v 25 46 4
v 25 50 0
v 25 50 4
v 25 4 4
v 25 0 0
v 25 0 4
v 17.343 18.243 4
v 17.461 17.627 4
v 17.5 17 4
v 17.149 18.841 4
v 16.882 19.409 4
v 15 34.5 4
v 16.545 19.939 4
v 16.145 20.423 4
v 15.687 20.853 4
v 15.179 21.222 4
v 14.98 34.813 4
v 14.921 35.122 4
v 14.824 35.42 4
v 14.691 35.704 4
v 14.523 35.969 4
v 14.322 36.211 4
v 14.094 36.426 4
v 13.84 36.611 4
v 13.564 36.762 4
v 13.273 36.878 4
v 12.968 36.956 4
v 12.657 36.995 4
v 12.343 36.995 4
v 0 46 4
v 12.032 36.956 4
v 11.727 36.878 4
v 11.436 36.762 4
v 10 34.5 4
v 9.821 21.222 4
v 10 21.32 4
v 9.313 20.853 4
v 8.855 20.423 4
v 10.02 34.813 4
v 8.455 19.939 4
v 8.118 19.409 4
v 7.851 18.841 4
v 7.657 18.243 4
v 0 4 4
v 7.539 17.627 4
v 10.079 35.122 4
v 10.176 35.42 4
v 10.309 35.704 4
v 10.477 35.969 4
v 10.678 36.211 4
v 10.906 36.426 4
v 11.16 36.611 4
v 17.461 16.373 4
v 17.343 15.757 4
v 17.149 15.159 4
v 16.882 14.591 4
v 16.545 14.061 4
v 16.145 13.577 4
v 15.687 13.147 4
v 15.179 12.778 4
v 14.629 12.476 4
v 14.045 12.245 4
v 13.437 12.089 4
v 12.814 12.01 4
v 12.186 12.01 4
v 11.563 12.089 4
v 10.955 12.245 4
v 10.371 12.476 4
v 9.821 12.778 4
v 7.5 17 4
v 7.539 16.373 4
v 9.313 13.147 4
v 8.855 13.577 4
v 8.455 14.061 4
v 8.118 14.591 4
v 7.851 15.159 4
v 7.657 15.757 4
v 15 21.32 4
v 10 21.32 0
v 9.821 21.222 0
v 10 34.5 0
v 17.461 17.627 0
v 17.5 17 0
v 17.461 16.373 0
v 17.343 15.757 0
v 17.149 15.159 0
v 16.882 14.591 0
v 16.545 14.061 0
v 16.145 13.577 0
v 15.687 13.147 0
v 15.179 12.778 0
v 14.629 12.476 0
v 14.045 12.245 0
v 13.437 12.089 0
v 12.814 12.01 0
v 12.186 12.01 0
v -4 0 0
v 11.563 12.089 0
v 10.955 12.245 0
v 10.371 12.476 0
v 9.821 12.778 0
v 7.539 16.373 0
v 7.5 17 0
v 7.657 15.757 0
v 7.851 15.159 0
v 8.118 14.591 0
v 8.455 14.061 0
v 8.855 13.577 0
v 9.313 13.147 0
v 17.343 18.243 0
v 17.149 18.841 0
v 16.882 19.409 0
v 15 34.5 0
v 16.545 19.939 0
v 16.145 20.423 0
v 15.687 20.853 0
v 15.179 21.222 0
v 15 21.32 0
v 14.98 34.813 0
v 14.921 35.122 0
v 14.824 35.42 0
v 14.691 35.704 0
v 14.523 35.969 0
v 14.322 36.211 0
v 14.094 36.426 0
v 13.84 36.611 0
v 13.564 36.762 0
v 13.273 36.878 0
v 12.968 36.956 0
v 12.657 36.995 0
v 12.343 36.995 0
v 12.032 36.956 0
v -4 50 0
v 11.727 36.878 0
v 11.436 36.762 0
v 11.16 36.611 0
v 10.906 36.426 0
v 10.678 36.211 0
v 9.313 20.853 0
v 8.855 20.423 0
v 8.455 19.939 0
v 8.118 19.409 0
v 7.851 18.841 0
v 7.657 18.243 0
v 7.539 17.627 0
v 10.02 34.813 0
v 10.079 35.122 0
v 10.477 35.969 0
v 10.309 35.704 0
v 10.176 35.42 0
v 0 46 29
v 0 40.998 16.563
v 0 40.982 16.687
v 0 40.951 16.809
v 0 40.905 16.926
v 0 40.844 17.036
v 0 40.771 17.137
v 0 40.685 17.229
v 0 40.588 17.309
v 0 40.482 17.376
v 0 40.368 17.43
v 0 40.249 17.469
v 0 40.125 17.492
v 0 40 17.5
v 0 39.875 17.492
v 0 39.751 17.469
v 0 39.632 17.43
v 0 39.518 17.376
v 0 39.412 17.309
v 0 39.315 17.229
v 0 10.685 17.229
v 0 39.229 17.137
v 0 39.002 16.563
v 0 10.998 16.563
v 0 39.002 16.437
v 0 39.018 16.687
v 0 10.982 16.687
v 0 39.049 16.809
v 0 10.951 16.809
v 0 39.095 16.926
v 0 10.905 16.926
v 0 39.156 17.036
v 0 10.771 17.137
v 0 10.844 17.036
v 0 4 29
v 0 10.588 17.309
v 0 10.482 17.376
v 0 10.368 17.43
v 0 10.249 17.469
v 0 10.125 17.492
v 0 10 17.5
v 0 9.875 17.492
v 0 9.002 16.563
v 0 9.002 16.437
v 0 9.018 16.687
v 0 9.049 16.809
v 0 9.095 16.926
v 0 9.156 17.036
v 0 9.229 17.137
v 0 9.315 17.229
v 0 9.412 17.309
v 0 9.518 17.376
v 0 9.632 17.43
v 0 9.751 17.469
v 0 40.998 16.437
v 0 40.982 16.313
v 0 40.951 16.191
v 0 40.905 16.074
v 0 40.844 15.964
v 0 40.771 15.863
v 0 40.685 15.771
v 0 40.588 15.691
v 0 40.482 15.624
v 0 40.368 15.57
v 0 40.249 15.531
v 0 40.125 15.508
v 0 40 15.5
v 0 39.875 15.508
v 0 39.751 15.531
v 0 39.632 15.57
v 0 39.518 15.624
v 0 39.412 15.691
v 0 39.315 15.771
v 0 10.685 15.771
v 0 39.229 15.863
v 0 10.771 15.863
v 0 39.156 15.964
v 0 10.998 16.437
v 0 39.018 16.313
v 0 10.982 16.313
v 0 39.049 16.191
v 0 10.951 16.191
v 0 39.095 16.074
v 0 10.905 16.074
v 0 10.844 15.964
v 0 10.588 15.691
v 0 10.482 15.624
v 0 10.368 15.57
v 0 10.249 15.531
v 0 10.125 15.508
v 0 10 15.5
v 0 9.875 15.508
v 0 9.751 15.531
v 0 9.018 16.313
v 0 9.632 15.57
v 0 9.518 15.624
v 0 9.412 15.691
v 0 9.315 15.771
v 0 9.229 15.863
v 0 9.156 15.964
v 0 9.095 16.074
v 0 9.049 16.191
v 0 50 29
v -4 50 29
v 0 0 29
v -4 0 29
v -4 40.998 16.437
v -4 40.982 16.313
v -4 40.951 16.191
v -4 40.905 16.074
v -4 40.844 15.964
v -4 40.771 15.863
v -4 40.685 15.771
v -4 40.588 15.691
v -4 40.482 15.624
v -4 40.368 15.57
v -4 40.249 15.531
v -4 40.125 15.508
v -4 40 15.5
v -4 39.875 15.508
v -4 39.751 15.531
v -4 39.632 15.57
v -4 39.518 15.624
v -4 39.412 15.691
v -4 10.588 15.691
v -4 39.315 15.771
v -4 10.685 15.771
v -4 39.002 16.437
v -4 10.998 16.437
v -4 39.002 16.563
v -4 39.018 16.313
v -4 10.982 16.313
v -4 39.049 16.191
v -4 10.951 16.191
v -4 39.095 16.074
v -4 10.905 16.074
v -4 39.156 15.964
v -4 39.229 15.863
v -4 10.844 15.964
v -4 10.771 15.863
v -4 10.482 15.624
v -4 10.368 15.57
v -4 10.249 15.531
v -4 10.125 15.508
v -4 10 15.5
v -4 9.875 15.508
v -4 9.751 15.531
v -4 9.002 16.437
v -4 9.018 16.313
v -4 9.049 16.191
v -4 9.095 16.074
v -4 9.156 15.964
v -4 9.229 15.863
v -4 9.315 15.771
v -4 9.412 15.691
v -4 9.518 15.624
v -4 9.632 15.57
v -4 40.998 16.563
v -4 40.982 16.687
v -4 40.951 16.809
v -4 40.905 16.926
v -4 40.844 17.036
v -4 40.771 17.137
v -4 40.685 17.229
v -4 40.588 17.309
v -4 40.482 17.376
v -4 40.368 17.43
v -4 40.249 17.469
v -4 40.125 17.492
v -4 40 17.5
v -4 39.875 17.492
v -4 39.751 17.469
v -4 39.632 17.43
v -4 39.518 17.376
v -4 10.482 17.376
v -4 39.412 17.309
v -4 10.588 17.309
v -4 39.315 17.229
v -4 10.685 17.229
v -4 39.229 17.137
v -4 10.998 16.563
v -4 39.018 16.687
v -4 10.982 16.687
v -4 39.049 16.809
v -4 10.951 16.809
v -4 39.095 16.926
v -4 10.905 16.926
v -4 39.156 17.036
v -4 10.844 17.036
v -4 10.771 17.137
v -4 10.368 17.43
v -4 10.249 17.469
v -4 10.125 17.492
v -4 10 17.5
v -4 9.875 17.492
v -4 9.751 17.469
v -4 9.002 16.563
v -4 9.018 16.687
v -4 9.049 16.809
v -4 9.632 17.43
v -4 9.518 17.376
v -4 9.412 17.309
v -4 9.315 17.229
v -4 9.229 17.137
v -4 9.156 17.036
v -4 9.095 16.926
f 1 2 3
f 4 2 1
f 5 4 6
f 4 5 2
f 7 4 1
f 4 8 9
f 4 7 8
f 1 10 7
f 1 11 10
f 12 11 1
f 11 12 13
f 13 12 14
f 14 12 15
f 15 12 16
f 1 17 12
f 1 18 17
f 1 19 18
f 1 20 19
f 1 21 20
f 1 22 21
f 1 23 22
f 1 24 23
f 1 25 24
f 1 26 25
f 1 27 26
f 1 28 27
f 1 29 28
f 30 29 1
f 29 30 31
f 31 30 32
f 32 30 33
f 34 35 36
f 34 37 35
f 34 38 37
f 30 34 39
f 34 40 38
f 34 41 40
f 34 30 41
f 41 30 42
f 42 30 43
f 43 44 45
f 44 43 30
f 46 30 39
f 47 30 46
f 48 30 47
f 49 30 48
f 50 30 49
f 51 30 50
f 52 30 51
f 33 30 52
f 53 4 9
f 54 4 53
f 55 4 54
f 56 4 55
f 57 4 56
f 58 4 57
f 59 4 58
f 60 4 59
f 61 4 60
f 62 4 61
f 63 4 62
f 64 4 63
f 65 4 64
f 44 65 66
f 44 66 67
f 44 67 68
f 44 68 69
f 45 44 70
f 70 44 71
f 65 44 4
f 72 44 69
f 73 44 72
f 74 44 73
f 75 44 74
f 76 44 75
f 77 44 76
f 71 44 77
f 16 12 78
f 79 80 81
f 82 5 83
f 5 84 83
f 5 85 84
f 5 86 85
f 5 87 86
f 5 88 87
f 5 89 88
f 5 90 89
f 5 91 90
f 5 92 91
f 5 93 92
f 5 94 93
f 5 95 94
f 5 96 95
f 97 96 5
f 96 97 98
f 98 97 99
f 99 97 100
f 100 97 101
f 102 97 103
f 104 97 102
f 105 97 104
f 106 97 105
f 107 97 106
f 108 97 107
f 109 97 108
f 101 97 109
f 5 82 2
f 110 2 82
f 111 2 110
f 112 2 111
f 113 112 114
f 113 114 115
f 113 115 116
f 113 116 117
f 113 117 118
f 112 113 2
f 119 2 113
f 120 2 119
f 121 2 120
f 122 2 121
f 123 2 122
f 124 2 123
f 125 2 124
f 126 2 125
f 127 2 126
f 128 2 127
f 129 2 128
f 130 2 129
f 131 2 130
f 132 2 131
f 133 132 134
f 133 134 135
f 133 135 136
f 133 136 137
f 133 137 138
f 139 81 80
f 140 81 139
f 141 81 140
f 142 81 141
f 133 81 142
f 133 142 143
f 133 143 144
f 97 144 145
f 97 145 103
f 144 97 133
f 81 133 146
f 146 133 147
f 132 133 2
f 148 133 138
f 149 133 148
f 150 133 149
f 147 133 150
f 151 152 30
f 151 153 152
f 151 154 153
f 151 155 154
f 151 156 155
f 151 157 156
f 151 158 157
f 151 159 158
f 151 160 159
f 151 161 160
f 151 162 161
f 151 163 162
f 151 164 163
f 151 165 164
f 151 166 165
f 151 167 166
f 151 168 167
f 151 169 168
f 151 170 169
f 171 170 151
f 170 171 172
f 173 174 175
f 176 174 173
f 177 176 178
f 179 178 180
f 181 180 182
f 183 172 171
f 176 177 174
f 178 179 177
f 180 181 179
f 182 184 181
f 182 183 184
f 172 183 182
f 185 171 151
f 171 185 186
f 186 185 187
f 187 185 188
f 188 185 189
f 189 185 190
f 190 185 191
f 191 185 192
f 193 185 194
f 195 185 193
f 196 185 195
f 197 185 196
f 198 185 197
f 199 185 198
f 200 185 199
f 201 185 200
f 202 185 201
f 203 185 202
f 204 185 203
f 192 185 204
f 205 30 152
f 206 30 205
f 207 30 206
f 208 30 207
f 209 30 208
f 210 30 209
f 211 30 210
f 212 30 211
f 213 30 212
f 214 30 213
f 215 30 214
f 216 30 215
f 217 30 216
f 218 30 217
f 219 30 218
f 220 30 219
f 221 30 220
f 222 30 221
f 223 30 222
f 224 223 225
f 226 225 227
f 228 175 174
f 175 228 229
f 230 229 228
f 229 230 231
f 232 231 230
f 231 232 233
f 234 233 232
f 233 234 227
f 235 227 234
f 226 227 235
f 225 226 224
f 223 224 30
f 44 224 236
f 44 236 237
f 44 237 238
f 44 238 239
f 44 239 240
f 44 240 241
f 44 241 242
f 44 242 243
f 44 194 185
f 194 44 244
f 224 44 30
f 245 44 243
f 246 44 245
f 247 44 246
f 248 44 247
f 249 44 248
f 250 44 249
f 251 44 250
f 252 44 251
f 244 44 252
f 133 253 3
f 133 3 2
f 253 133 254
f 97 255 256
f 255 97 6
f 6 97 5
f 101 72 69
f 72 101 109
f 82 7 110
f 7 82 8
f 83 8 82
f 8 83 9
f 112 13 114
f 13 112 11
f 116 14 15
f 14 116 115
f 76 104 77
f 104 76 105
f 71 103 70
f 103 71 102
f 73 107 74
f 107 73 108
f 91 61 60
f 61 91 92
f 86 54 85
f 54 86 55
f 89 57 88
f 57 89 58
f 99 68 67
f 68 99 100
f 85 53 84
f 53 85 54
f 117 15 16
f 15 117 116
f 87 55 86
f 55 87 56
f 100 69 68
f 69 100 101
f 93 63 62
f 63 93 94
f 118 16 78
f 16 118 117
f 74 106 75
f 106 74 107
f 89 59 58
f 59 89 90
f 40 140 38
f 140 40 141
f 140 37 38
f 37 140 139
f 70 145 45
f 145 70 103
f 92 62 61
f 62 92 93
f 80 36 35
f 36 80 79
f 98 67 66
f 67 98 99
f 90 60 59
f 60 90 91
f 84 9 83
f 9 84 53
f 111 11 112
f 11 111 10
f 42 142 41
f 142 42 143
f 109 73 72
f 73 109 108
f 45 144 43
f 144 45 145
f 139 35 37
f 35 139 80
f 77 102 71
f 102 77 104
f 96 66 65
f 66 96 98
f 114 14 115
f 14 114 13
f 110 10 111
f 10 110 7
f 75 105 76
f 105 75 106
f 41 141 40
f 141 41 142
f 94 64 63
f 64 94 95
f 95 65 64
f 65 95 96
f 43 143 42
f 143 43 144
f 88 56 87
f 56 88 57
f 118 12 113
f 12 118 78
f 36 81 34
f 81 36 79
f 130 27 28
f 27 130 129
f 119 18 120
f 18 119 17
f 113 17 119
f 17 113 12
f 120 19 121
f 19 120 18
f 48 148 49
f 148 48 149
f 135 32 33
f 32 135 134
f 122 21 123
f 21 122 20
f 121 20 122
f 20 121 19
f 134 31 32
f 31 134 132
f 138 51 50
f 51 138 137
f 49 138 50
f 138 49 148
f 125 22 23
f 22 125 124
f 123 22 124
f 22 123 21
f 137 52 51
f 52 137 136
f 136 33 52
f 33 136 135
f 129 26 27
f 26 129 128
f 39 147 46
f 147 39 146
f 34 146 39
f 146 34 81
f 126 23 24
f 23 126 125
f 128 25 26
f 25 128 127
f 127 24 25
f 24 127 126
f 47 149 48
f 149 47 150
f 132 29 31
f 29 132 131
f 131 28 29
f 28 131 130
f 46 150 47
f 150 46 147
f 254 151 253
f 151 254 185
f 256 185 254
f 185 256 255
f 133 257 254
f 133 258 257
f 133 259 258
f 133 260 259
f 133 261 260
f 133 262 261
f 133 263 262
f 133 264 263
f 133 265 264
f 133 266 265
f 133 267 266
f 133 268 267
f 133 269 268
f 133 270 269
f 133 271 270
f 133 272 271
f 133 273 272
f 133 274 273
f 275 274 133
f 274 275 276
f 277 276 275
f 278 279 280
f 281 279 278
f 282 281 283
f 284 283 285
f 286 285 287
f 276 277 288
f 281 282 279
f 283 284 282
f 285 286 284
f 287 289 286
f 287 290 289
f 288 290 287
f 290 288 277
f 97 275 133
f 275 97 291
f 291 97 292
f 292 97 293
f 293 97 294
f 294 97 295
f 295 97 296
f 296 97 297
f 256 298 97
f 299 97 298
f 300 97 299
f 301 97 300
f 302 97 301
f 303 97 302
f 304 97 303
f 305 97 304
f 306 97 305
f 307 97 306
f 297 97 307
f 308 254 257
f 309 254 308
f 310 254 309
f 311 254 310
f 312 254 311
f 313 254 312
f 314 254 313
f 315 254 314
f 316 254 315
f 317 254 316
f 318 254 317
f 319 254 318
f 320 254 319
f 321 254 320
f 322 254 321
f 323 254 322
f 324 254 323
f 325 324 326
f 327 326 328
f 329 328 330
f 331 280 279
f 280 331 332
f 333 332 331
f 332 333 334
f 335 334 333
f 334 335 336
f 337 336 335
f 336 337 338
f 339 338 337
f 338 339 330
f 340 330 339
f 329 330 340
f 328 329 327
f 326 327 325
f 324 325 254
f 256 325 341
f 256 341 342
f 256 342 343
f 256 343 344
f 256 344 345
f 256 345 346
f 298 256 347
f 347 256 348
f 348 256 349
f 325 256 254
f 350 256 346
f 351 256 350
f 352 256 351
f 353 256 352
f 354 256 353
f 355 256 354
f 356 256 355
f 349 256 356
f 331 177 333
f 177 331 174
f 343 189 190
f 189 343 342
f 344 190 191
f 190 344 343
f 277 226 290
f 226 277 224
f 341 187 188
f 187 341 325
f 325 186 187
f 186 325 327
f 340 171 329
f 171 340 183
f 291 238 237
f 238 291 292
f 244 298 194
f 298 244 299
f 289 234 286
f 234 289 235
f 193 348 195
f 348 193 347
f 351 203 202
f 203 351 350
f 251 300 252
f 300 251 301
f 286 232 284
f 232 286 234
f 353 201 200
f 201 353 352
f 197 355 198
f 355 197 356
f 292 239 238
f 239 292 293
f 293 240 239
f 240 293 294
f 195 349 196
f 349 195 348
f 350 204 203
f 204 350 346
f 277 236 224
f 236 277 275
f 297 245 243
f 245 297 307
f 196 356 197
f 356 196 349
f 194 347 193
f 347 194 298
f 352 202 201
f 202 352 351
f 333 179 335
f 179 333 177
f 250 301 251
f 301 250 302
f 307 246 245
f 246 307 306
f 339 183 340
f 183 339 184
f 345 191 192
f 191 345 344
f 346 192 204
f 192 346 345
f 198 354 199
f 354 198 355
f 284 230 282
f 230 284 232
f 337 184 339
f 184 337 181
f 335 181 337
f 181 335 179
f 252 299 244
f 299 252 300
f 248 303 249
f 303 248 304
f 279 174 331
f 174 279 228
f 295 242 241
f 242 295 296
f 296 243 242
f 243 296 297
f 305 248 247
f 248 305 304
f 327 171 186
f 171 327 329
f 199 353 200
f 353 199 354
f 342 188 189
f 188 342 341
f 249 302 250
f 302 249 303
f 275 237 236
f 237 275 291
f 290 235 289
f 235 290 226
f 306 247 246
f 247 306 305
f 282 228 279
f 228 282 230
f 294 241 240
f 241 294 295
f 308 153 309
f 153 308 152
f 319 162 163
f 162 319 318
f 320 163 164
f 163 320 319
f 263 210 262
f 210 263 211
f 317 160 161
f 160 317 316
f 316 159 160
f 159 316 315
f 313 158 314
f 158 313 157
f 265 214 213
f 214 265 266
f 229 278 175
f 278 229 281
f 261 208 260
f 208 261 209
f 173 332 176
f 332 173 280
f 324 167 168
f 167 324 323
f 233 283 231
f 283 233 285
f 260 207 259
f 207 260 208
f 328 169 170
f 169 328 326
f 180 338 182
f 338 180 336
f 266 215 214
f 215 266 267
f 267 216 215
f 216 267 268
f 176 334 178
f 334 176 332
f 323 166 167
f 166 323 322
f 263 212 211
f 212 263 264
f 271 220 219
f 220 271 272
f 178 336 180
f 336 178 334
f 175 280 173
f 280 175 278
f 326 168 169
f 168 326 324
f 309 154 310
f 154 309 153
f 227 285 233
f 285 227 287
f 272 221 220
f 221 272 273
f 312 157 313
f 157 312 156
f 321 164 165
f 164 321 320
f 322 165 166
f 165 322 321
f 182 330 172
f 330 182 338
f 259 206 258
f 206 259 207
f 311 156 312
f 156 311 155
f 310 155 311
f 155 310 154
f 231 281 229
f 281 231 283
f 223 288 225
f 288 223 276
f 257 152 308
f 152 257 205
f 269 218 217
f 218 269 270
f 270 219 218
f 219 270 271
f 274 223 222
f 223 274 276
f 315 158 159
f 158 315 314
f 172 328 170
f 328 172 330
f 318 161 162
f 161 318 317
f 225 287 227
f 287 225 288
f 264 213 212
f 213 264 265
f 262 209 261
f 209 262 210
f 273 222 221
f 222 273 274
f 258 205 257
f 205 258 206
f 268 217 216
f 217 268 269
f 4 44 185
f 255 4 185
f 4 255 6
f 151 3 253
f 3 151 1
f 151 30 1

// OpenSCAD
// file: ../common/prism.scad
module prism(l, w, h){
   polyhedron(
           points=[[0,0,0], [l,0,0], [l,w,0], [0,w,0], [0,w,h], [l,w,h]],
           faces=[[0,1,2,3],[5,4,3,2],[0,4,5,1],[0,3,4],[5,2,1]]
           );
}
// main file
include <../common/prism.scad>;


BRACKET_THICKNESS = 4;
BRACKET_FIXED_WIDTH = 50;
BRACKET_FIXED_HEIGHT = 25;
BRACKET_FIXED_HOLE_SIZE = 2;

BRACKET_SCREW_WIDTH = 5;

$fn = 50;
BRACKET_SCREW_OFFSET = 17;
BRACKET_SCREW_GUIDE_SIZE = 15;

difference () {
    cube([BRACKET_FIXED_HEIGHT, BRACKET_FIXED_WIDTH, BRACKET_THICKNESS]);
    translate ([BRACKET_FIXED_HEIGHT / 2, BRACKET_SCREW_OFFSET, 0]) cylinder(d = BRACKET_SCREW_WIDTH + 5, h = BRACKET_THICKNESS);
    translate ([BRACKET_FIXED_HEIGHT / 2 - BRACKET_SCREW_WIDTH / 2, BRACKET_SCREW_OFFSET + (BRACKET_SCREW_WIDTH / 2), 0]) cube([BRACKET_SCREW_WIDTH, BRACKET_SCREW_GUIDE_SIZE, BRACKET_THICKNESS]);    
    translate ([BRACKET_FIXED_HEIGHT / 2, BRACKET_SCREW_OFFSET + (BRACKET_SCREW_WIDTH / 2) + BRACKET_SCREW_GUIDE_SIZE, 0]) cylinder(d = BRACKET_SCREW_WIDTH, h = BRACKET_THICKNESS);
   
}

rotate ([0, -90, 0]) {
    difference() {
        cube([BRACKET_FIXED_HEIGHT + BRACKET_THICKNESS, BRACKET_FIXED_WIDTH, BRACKET_THICKNESS]);
        translate ([BRACKET_FIXED_HEIGHT / 2 + BRACKET_THICKNESS, 10, 0]) cylinder(d = BRACKET_FIXED_HOLE_SIZE, h = BRACKET_THICKNESS);
        translate ([BRACKET_FIXED_HEIGHT / 2 + BRACKET_THICKNESS, BRACKET_FIXED_WIDTH - 10, 0]) cylinder(d = BRACKET_FIXED_HOLE_SIZE, h = BRACKET_THICKNESS);
    }
}
   


translate([BRACKET_FIXED_HEIGHT, 0, BRACKET_THICKNESS]) rotate([0, 0, 90]) prism(BRACKET_THICKNESS, BRACKET_FIXED_HEIGHT, BRACKET_FIXED_HEIGHT);

translate([BRACKET_FIXED_HEIGHT, BRACKET_FIXED_WIDTH - BRACKET_THICKNESS, BRACKET_THICKNESS]) rotate([0, 0, 90]) prism(BRACKET_THICKNESS, BRACKET_FIXED_HEIGHT, BRACKET_FIXED_HEIGHT);
